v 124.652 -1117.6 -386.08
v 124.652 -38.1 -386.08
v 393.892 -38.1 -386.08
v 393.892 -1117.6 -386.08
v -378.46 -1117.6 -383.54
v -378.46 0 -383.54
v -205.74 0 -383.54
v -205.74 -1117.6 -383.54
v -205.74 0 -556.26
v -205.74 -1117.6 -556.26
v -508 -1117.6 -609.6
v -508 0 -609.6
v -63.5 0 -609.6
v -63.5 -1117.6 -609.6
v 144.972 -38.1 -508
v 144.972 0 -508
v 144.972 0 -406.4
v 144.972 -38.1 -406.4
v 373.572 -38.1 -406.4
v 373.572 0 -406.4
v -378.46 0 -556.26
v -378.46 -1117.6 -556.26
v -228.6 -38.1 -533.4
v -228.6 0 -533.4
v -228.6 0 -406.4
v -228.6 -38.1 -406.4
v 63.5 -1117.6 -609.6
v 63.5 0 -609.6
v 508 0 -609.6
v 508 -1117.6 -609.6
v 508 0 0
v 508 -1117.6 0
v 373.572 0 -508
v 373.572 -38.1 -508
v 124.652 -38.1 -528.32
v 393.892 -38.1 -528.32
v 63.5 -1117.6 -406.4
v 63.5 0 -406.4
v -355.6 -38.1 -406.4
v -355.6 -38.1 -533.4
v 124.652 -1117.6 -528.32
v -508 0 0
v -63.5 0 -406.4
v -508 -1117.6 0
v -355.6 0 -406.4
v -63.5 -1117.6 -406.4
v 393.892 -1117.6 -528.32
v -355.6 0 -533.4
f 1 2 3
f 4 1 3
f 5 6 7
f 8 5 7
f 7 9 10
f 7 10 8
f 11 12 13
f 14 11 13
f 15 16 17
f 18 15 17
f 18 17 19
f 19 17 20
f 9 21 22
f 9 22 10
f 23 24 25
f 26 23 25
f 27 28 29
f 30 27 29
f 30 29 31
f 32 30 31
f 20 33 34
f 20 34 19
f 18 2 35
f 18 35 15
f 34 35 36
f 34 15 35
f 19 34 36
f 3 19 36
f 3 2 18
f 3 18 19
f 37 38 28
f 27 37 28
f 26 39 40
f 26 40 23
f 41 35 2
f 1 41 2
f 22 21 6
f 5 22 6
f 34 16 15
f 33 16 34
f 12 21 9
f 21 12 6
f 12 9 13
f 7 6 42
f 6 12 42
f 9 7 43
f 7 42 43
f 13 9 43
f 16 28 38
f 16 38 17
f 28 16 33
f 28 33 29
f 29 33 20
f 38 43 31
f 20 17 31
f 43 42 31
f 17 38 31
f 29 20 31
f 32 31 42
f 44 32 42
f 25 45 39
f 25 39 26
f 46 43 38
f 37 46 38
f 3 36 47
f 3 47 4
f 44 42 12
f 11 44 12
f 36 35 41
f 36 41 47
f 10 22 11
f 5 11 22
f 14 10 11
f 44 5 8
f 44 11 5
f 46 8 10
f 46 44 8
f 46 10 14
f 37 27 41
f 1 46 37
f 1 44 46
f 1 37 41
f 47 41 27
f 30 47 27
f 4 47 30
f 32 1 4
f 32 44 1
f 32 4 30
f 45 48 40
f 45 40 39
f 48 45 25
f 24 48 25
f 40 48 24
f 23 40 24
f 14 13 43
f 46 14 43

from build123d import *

# Parameters (mm, degrees)
F0_W     = 172.72
F0_H     = 172.72
F0_W_2   = 269.24
F0_H_2   = 142.24
F2_DEPTH = 1117.6
F0_W_3   = 228.6
F0_H_3   = 101.6
F3_DEPTH = 38.1
F0_W_4   = 127
F0_H_4   = 127


# Not quite as in the source:
# - the program builds the solid bodies; features that only make, move or delete a surface that nothing else refers to are left out


with BuildPart() as f2:
    # F0 (on Front) → F2 (new body)
    with BuildSketch(Plane.XZ):
        Polygon((508, 0), (0, 0), (-508, 0), (-508, -609.6), (-67.5734877586, -609.6), (-63.5, -609.6), (-63.5, -406.4), (63.5, -406.4), (63.5, -609.6), (508, -609.6), align=None)
        with Locations((-292.1, -469.9)):
            Rectangle(F0_W, F0_H, mode=Mode.SUBTRACT)
        with Locations((259.2723690559, -457.2)):
            Rectangle(F0_W_2, F0_H_2, mode=Mode.SUBTRACT)
    extrude(amount=F2_DEPTH)

    # F0 (on Front) → F3 (join)
    with BuildSketch(Plane.XZ):
        with Locations((259.2723690559, -457.2)):
            Rectangle(F0_W_2, F0_H_2)
        with Locations((259.2723690559, -457.2)):
            Rectangle(F0_W_3, F0_H_3, mode=Mode.SUBTRACT)
    extrude(amount=F3_DEPTH)


with BuildPart() as f3:
    # F0 (on Front) → F3, piece 2 (new body)
    with BuildSketch(Plane.XZ):
        with Locations((-292.1, -469.9)):
            Rectangle(F0_W_4, F0_H_4)
    extrude(amount=F3_DEPTH)


solid = Compound([f2.part, f3.part])
